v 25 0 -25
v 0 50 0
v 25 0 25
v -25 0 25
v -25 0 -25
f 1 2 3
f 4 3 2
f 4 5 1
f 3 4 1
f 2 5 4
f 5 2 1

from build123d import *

# Parameters (mm, degrees)
SKETCH1_W           = 50
SKETCH1_H           = 50
BOSS_EXTRUDE1_DEPTH = 50
SKETCH4_OUTSIDE_W   = 69.32
SKETCH4_OUTSIDE_H   = 69.32
CUT_EXTRUDE3_DEPTH  = 62.23724357
SKETCH5_OUTSIDE_W   = 69.32
SKETCH5_OUTSIDE_H   = 69.32
CUT_EXTRUDE4_DEPTH  = 62.23724357
SKETCH6_OUTSIDE_W   = 69.32
SKETCH6_OUTSIDE_H   = 69.32
CUT_EXTRUDE5_DEPTH  = 62.23724357
SKETCH7_OUTSIDE_W   = 69.32
SKETCH7_OUTSIDE_H   = 69.32
CUT_EXTRUDE6_DEPTH  = 62.23724357


with BuildPart() as part:
    # Sketch1 → Boss-Extrude1 (new body)
    with BuildSketch(Plane(origin=(0, 0, 0), x_dir=(1, 0, 0), z_dir=(0, 1, 0))):
        Rectangle(SKETCH1_W, SKETCH1_H)
    extrude(amount=BOSS_EXTRUDE1_DEPTH)

    # Sketch4 outside → Cut-Extrude3 (cut, through all)
    with BuildSketch(Plane(origin=(0, 0, 0), x_dir=(0, 0, -1), z_dir=(1, 0, 0))):
        with Locations((0, 25)):
            Rectangle(SKETCH4_OUTSIDE_W, SKETCH4_OUTSIDE_H)
        Polygon((-25, 0), (0, 50), (25, 0), align=None, mode=Mode.SUBTRACT)
    extrude(amount=-CUT_EXTRUDE3_DEPTH, mode=Mode.SUBTRACT)

    # Sketch5 outside → Cut-Extrude4 (cut, through all)
    with BuildSketch(Plane(origin=(0, 0, 0), x_dir=(0, 0, -1), z_dir=(1, 0, 0))):
        with Locations((0, 25)):
            Rectangle(SKETCH5_OUTSIDE_W, SKETCH5_OUTSIDE_H)
        Polygon((-25, 0), (0, 50), (25, 0), align=None, mode=Mode.SUBTRACT)
    extrude(amount=CUT_EXTRUDE4_DEPTH, mode=Mode.SUBTRACT)

    # Sketch6 outside → Cut-Extrude5 (cut, through all)
    with BuildSketch(Plane.XY):
        with Locations((0, 25)):
            Rectangle(SKETCH6_OUTSIDE_W, SKETCH6_OUTSIDE_H)
        Polygon((-25, 0), (0, 50), (25, 0), align=None, mode=Mode.SUBTRACT)
    extrude(amount=-CUT_EXTRUDE5_DEPTH, mode=Mode.SUBTRACT)

    # Sketch7 outside → Cut-Extrude6 (cut, through all)
    with BuildSketch(Plane.XY):
        with Locations((0, 25)):
            Rectangle(SKETCH7_OUTSIDE_W, SKETCH7_OUTSIDE_H)
        Polygon((-25, 0), (0, 50), (25, 0), align=None, mode=Mode.SUBTRACT)
    extrude(amount=CUT_EXTRUDE6_DEPTH, mode=Mode.SUBTRACT)


solid = part.part
